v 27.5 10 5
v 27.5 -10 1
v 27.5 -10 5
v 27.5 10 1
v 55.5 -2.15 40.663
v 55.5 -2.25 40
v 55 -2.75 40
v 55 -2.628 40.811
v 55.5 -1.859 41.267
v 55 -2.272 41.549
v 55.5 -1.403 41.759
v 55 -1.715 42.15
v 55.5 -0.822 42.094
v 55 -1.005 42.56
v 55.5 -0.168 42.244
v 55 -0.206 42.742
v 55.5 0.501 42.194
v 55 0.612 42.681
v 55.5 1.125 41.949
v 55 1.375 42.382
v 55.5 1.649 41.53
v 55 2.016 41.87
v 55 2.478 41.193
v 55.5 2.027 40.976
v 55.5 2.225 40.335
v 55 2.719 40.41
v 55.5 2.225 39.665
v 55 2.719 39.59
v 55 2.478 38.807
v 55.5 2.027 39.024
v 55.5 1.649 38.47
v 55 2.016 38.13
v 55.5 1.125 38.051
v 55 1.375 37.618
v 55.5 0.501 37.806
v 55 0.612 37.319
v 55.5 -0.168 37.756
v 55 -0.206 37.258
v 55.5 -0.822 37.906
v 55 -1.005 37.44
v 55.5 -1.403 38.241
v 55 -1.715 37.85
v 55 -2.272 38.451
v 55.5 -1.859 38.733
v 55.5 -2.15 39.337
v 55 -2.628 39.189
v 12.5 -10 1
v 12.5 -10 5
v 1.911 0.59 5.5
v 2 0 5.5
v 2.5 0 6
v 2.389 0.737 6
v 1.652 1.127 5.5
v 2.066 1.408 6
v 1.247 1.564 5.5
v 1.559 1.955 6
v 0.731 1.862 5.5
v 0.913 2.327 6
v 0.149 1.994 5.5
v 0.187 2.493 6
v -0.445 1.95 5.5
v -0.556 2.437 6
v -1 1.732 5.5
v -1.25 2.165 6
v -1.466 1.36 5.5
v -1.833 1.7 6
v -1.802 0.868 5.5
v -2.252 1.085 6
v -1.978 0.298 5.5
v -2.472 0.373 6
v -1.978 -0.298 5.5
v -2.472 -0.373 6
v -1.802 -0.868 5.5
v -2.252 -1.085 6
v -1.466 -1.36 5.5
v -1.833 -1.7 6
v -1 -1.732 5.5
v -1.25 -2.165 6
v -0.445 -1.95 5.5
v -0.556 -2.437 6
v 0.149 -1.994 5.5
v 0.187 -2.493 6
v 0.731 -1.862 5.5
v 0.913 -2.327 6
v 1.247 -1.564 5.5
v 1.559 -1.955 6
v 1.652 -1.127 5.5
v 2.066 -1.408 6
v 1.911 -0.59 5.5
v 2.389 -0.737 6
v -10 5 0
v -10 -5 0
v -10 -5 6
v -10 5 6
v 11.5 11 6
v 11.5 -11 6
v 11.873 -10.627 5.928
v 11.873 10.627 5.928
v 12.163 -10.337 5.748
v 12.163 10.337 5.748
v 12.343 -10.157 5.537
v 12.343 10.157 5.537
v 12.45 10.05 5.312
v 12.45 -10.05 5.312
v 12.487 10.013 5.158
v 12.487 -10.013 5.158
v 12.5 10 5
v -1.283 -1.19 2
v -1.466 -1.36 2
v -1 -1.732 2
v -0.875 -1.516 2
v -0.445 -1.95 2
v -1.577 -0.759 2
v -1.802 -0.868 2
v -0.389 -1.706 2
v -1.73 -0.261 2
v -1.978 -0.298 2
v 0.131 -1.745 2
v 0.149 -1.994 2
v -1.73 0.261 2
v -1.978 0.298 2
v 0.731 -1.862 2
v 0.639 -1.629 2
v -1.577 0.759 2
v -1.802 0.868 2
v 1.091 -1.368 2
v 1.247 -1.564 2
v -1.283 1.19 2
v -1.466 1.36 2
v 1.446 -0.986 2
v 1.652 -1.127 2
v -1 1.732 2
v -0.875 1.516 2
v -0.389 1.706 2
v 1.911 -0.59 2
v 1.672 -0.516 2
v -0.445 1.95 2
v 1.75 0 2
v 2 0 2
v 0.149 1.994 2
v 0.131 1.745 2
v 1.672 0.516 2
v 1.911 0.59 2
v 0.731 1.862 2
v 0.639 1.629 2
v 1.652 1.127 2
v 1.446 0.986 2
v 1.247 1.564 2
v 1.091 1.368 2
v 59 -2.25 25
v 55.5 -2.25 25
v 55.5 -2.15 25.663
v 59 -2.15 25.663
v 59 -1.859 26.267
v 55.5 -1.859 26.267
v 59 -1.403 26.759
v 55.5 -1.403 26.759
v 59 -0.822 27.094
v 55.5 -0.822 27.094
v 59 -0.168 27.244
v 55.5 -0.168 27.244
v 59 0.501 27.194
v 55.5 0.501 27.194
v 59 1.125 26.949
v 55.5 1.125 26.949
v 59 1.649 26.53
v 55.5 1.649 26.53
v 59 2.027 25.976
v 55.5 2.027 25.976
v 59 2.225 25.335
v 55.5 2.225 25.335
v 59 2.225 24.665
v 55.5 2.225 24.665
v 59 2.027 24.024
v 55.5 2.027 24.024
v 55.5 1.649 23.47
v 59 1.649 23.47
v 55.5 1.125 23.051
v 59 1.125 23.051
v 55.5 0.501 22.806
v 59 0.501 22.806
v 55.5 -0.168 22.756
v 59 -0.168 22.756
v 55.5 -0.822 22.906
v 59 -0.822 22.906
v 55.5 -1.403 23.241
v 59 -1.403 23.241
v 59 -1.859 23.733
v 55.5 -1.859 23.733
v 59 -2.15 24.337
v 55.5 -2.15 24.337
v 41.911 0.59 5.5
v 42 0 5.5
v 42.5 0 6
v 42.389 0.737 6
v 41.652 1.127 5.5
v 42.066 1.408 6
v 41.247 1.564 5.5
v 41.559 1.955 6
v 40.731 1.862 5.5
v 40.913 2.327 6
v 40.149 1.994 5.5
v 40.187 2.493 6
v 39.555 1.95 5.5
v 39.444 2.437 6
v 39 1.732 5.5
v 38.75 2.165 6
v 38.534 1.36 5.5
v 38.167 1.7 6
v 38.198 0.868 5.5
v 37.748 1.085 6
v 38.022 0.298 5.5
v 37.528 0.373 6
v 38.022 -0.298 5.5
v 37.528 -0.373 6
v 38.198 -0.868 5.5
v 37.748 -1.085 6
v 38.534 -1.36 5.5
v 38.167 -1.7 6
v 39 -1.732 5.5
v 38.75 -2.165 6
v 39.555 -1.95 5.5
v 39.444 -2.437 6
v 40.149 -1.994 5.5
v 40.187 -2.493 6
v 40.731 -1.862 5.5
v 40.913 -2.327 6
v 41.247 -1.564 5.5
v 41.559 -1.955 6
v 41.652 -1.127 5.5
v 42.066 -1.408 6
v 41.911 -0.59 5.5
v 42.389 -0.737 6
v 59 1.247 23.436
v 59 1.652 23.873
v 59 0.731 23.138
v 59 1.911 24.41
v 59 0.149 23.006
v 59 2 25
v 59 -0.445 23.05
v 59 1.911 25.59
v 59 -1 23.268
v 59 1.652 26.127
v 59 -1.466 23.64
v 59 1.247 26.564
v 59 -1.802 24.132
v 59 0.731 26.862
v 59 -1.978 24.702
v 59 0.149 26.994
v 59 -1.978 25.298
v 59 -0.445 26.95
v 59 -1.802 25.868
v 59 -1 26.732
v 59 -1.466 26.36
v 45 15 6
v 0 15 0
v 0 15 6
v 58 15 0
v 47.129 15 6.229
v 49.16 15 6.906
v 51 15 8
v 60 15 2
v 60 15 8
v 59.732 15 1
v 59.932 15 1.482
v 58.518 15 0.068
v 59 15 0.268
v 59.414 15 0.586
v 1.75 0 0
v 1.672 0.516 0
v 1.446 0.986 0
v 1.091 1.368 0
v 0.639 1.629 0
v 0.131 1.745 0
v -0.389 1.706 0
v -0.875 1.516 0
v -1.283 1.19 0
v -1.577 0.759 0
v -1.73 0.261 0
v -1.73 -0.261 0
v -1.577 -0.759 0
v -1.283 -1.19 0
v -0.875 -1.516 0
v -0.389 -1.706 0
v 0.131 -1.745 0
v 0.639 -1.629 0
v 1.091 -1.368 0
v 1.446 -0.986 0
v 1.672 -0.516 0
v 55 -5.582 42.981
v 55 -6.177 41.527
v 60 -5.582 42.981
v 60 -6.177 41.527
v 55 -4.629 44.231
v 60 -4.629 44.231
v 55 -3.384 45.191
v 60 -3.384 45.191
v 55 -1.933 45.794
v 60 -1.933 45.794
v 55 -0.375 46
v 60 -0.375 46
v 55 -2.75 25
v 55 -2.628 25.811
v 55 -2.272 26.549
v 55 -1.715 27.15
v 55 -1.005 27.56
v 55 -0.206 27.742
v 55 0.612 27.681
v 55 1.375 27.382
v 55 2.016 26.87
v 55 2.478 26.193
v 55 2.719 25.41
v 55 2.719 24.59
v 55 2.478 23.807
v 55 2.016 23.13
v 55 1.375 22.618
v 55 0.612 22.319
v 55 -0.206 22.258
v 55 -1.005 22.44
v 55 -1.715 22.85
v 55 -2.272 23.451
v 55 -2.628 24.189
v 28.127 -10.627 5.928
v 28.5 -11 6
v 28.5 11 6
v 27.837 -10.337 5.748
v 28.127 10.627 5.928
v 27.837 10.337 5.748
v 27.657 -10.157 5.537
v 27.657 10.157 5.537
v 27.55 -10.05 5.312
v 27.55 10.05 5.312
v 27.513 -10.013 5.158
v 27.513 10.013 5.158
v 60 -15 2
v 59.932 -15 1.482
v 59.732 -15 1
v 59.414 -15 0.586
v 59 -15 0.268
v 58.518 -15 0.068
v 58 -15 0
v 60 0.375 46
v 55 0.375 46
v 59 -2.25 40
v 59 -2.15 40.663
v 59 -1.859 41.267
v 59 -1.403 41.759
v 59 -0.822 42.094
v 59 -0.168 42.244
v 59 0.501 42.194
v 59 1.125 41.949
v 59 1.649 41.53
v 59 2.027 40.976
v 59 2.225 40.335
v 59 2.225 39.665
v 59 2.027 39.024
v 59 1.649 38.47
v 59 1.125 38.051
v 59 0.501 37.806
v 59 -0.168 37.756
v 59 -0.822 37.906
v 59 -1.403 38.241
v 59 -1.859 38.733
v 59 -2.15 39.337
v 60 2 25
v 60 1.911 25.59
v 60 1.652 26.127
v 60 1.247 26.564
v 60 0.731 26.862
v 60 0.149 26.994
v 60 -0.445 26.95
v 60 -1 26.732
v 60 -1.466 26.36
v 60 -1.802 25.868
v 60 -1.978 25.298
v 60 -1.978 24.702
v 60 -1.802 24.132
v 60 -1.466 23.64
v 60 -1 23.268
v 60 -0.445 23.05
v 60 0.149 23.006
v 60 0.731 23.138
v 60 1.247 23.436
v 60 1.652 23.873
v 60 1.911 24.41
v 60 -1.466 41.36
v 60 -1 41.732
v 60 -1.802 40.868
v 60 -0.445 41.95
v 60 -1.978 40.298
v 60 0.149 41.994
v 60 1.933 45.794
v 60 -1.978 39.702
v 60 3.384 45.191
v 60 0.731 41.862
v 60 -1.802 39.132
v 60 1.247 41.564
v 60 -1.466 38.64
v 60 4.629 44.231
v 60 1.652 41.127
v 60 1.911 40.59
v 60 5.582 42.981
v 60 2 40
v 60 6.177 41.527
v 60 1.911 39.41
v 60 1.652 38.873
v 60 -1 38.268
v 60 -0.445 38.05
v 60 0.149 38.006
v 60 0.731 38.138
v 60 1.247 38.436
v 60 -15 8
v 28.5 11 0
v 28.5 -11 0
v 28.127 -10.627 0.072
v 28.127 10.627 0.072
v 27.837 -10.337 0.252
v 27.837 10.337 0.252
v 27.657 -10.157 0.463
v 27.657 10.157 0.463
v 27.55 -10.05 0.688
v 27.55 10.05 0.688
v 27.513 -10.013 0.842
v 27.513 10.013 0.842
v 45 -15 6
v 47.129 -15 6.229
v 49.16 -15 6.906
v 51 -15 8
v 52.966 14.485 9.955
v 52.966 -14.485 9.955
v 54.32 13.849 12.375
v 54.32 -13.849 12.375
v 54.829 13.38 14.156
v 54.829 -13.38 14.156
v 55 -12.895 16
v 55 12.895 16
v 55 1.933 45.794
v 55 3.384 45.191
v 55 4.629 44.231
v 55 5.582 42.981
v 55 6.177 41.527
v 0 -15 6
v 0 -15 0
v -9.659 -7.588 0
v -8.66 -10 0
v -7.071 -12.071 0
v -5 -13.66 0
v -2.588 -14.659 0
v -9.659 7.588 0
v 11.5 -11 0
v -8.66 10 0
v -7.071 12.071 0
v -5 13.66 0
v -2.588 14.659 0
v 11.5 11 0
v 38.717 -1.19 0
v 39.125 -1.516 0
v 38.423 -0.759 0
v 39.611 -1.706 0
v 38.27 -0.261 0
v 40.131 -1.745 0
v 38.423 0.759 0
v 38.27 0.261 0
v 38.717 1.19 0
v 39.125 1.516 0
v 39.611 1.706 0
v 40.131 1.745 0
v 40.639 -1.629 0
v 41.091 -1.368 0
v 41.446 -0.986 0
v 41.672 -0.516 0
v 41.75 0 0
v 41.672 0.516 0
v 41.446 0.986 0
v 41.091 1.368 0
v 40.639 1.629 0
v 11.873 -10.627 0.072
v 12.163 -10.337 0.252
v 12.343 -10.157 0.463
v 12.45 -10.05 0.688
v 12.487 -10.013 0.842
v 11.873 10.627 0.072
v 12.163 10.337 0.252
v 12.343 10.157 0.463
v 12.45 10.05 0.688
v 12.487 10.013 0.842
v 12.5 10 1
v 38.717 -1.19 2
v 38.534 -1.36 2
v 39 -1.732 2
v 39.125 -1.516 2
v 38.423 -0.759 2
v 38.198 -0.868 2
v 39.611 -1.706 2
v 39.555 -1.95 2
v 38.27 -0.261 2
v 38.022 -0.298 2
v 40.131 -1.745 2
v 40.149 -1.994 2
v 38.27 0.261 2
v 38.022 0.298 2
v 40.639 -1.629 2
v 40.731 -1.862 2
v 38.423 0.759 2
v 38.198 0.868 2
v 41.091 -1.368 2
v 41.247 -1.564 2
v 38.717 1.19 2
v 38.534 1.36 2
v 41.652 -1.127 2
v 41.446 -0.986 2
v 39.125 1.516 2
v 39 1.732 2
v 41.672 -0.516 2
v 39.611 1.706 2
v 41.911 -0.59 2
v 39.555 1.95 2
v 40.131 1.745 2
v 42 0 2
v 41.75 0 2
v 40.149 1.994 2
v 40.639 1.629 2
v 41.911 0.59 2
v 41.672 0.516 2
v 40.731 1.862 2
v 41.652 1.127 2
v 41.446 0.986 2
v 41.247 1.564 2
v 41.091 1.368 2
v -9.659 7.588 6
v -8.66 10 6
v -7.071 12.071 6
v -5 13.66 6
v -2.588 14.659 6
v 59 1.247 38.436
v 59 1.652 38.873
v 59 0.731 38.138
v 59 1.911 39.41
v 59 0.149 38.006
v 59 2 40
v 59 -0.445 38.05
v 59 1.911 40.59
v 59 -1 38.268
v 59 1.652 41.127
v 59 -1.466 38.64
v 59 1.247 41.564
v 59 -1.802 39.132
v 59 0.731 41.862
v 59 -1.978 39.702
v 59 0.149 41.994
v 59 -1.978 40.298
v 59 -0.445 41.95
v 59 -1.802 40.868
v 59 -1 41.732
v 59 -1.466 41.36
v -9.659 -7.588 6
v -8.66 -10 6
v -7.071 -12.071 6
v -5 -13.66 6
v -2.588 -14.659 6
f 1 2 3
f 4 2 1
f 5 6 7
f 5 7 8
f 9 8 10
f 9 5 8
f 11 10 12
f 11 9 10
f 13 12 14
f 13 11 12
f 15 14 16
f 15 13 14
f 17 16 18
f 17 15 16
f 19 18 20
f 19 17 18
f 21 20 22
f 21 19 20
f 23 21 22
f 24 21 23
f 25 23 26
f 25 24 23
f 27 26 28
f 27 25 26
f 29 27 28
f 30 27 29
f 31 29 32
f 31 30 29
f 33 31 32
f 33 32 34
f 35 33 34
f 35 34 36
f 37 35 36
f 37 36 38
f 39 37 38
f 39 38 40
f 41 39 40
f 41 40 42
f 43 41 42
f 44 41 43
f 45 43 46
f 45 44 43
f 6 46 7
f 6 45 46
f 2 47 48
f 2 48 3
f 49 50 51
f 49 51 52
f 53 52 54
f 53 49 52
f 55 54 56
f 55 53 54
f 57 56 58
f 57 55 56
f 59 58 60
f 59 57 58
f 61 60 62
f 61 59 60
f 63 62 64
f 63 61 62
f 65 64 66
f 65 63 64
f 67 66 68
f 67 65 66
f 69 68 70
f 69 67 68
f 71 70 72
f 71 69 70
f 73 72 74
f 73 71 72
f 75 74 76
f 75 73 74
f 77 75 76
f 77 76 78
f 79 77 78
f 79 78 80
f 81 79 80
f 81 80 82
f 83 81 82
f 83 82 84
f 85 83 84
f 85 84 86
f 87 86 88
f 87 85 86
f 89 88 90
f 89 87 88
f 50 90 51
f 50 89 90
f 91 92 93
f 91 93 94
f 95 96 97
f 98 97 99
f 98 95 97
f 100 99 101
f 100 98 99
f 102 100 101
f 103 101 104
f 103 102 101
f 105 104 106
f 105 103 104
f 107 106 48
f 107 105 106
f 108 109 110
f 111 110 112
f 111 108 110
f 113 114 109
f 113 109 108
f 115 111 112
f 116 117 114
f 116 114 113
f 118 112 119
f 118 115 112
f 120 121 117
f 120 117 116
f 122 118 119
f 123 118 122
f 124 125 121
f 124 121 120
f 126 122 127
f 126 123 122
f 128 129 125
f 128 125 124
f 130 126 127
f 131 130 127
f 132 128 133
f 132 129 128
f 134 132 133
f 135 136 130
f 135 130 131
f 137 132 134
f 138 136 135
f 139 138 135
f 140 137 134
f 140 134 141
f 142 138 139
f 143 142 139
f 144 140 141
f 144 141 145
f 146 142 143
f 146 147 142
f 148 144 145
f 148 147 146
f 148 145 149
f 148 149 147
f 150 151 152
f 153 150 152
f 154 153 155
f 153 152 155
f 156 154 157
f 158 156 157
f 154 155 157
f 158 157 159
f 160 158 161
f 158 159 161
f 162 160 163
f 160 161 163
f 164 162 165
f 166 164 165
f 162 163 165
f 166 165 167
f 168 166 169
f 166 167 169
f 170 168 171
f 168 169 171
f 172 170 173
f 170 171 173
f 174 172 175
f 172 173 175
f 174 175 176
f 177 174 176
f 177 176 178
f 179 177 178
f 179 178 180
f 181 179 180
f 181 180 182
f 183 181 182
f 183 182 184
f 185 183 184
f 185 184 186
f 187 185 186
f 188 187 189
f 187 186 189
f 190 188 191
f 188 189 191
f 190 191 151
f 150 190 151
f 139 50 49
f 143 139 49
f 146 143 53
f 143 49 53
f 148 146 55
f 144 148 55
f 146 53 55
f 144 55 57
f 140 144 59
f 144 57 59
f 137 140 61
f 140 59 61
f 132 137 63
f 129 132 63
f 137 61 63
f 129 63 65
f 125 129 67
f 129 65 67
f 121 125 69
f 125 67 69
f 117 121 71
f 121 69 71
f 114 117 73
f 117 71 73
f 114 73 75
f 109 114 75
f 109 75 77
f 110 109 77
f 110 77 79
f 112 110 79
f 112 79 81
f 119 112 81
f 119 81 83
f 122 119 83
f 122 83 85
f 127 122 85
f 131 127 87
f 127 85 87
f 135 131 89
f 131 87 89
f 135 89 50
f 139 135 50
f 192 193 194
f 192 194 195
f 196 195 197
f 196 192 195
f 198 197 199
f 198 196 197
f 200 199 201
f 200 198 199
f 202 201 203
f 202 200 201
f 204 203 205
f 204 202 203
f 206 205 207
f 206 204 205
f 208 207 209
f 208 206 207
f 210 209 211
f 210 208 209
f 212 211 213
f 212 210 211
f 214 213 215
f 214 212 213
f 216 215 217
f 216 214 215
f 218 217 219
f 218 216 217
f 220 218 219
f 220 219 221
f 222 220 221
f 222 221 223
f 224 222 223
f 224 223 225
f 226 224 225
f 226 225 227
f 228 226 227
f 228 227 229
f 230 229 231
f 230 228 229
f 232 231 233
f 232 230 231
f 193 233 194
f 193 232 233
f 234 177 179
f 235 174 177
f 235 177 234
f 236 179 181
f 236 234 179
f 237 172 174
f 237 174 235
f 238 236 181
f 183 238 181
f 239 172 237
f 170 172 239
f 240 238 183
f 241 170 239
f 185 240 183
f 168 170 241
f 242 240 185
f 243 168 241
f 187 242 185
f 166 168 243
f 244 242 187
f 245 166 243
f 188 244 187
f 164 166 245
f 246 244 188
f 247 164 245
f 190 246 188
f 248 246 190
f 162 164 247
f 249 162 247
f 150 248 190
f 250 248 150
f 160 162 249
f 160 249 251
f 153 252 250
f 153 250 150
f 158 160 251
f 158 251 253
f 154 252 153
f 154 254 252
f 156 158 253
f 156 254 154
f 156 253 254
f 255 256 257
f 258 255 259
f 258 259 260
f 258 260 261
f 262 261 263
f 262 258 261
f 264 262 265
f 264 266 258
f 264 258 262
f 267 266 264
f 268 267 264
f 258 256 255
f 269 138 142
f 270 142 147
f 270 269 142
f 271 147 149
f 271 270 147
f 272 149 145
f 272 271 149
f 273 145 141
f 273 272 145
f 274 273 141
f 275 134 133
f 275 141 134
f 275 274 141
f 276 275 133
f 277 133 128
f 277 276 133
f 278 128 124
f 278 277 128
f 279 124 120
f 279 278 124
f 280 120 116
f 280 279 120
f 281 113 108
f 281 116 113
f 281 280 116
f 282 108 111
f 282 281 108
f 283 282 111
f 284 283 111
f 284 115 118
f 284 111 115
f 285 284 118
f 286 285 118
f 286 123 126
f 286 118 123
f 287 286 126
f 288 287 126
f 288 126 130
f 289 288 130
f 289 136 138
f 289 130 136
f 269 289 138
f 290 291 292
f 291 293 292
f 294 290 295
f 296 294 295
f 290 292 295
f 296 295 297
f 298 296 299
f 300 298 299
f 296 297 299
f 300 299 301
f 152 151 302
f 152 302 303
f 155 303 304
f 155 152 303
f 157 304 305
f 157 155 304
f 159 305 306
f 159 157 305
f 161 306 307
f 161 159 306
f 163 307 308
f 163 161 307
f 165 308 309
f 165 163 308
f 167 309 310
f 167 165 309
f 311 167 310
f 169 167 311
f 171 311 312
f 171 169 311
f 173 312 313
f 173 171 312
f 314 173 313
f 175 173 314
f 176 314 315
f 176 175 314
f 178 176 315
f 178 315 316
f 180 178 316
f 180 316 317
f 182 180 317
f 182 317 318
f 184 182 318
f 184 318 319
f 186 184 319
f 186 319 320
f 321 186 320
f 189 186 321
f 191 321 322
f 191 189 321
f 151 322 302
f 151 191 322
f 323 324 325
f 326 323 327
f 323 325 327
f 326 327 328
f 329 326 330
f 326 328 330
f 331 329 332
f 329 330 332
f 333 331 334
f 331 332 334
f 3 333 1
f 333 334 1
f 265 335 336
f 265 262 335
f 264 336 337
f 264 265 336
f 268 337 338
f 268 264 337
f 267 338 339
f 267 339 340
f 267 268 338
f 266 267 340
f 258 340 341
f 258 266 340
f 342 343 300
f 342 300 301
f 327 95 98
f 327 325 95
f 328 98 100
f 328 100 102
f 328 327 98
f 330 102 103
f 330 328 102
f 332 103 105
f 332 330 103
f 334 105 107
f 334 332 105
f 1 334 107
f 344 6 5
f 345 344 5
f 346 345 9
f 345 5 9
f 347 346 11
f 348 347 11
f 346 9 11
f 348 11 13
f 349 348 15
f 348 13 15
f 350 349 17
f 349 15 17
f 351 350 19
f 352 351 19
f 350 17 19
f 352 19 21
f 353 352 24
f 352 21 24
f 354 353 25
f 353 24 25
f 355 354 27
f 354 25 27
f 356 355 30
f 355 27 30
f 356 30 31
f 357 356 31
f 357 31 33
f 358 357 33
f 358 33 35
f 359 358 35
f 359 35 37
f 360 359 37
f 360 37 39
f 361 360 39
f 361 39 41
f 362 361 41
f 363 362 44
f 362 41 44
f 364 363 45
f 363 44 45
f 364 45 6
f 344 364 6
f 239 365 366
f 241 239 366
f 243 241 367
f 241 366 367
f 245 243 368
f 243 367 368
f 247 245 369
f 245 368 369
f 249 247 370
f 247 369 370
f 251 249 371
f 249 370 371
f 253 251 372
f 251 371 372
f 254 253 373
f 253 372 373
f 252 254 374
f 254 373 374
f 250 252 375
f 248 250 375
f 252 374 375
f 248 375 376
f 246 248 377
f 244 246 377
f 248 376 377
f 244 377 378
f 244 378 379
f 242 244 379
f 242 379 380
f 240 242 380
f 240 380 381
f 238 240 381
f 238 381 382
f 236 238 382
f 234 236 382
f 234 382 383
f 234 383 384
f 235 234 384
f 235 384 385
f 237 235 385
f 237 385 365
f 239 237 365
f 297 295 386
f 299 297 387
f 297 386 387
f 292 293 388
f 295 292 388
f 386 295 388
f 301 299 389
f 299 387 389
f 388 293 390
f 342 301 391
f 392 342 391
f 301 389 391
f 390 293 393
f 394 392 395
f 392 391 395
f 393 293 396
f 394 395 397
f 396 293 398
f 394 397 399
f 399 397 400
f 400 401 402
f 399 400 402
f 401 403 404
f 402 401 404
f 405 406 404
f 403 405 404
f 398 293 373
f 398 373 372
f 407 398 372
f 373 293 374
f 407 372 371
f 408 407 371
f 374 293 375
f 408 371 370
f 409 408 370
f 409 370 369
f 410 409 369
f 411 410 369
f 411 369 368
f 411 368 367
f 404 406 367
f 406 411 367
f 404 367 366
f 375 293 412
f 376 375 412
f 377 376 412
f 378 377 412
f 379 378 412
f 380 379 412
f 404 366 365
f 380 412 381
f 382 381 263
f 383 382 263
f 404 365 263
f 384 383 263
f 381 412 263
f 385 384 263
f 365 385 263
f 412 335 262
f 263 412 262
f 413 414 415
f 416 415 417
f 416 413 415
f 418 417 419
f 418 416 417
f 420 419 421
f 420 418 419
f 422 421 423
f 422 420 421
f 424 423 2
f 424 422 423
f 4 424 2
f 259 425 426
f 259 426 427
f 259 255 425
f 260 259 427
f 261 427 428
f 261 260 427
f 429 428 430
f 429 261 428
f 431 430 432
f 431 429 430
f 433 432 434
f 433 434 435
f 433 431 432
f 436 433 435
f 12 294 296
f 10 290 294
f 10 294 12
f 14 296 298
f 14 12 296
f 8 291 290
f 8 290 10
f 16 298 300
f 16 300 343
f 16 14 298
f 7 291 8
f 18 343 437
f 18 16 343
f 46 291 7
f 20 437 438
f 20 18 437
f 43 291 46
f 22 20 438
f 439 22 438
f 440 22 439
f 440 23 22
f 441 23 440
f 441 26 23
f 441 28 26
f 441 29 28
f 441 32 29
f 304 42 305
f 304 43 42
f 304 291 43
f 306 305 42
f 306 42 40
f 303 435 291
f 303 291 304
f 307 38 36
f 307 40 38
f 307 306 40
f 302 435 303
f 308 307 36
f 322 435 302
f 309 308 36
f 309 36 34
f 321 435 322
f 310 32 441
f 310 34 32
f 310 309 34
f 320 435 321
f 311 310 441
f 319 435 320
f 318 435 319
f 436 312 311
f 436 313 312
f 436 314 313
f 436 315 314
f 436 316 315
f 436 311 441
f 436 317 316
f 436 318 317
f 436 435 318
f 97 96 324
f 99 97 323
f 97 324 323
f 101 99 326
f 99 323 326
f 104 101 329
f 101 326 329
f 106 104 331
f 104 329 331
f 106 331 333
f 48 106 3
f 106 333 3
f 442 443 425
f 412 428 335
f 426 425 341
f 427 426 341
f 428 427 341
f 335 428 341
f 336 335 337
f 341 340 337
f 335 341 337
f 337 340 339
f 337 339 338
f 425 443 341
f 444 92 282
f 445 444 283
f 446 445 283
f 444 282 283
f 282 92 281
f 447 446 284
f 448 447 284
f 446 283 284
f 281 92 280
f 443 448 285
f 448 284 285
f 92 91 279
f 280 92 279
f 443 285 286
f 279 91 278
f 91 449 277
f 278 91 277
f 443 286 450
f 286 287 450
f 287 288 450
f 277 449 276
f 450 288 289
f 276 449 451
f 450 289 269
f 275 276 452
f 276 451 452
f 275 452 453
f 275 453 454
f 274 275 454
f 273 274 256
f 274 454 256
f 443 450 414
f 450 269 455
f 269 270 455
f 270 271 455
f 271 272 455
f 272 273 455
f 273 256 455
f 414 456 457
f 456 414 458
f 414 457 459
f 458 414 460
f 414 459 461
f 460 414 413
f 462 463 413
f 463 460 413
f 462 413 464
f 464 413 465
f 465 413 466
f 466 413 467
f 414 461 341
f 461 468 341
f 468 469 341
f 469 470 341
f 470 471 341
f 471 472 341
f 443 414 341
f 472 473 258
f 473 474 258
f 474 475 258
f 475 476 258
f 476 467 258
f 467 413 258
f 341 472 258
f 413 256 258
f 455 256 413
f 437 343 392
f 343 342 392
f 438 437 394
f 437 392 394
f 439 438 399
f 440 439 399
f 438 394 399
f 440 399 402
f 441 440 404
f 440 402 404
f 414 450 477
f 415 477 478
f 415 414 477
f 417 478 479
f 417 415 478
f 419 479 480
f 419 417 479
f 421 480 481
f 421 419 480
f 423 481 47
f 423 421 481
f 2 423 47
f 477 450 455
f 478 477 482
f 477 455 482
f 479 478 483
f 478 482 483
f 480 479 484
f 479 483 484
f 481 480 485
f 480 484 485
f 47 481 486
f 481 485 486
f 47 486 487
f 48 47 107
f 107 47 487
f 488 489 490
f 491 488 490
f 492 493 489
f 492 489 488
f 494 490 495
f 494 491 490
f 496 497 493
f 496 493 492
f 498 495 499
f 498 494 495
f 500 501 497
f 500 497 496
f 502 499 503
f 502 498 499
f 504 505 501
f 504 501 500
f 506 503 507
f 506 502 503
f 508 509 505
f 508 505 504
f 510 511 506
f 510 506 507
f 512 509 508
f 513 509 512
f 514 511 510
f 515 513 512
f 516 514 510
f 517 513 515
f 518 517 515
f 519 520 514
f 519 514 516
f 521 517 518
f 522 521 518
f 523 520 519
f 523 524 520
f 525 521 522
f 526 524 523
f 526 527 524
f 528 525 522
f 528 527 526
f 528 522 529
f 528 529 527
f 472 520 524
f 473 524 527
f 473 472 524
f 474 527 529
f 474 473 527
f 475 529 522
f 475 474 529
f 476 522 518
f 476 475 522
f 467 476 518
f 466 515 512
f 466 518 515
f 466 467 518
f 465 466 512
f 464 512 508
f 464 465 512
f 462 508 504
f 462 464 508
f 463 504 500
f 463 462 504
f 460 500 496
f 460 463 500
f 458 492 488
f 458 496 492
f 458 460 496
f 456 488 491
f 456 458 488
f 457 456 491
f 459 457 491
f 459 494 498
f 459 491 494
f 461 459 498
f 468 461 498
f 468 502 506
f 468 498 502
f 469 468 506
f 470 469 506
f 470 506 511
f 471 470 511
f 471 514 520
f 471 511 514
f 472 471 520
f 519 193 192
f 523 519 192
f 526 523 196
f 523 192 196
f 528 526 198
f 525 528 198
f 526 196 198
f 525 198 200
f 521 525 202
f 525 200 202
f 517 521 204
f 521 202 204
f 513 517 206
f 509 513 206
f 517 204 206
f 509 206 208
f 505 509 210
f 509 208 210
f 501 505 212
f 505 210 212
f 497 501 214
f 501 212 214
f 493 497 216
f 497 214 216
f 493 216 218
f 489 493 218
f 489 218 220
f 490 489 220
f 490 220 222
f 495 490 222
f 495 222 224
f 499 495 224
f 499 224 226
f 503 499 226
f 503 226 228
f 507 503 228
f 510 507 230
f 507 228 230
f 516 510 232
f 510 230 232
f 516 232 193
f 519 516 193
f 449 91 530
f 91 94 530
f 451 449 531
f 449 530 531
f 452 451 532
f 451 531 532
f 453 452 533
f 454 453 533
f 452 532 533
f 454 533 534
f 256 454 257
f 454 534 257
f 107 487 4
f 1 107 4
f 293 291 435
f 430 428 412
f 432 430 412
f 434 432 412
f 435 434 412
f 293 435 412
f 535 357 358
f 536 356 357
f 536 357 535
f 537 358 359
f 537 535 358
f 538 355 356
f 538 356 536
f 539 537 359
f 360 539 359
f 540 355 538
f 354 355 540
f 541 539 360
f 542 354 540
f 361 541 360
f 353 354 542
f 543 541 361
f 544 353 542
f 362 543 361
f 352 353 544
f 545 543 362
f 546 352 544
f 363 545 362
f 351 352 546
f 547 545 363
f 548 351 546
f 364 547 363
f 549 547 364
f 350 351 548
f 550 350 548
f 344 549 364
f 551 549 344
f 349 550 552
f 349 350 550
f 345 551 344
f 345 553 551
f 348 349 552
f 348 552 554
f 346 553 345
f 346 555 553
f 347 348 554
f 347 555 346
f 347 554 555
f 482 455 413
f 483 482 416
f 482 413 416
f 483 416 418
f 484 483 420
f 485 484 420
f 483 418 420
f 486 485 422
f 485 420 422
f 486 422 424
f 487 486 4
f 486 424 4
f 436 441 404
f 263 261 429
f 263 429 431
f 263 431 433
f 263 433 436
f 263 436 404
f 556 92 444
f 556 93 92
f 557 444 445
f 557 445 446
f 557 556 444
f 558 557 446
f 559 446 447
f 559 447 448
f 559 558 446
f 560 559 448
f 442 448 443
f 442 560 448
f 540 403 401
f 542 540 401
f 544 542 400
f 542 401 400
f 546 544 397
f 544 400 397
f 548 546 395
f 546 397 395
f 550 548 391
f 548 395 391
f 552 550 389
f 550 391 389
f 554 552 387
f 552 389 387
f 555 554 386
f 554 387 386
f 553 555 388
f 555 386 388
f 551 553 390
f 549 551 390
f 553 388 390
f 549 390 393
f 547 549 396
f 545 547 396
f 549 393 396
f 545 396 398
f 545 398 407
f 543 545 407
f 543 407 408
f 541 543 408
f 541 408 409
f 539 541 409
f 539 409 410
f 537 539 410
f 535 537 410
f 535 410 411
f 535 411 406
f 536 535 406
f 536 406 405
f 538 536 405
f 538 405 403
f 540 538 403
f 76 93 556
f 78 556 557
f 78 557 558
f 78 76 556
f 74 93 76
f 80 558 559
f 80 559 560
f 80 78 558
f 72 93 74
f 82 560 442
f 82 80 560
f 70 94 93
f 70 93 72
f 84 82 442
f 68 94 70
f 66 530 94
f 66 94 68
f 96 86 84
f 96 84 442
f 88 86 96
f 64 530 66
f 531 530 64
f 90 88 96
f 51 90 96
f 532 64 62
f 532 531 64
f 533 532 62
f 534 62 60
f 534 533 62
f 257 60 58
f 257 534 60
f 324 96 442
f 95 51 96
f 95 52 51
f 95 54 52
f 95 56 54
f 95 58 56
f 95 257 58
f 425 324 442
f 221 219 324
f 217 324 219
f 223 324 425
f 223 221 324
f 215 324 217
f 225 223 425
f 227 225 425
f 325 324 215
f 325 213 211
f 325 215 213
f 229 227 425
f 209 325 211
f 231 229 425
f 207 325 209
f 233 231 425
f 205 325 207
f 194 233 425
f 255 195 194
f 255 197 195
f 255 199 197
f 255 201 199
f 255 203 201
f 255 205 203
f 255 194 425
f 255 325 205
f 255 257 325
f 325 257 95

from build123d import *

# Parameters (mm, degrees)
SKETCH_W        = 70
SKETCH_H        = 30
SKETCH_R        = 1.75
SKETCH_W_2      = 15
SKETCH_H_2      = 20
PAD_DEPTH       = 6
FILLET_R        = 10
FILLET001_R     = 1
SKETCH001_W     = 5
SKETCH001_H     = 30
PAD001_DEPTH    = 40
CHAMFER_SIZE2   = 38
CHAMFER_SIZE    = 10
SKETCH002_R     = 2
POCKET_DEPTH    = 4
CHAMFER001_SIZE = 0.5
FILLET002_R     = 10
FILLET003_R     = 2
FILLET004_R     = 6
SKETCH003_R     = 2
POCKET001_DEPTH = 70.001
SKETCH004_R     = 2.25
POCKET002_DEPTH = 4
CHAMFER002_SIZE = 0.5


with BuildPart() as part:
    # Sketch → Pad (new body)
    with BuildSketch(Plane.XY):
        with Locations((25, 0)):
            Rectangle(SKETCH_W, SKETCH_H)
        Circle(SKETCH_R, mode=Mode.SUBTRACT)
        with Locations((40, 0)):
            Circle(SKETCH_R, mode=Mode.SUBTRACT)
        with Locations((20, 0)):
            Rectangle(SKETCH_W_2, SKETCH_H_2, mode=Mode.SUBTRACT)
    extrude(amount=PAD_DEPTH)

    # Fillet
    fillet_edges = [part.edges().sort_by_distance(p)[0] for p in [
        (-10, 15, 3),
        (-10, -15, 3),
    ]]
    fillet(fillet_edges, radius=FILLET_R)

    # Fillet001
    fillet001_edges = [part.edges().sort_by_distance(p)[0] for p in [
        (12.5, 0, 6),
        (12.5, 0, 0),
        (20, 10, 0),
        (20, 10, 6),
        (27.5, 0, 6),
        (20, -10, 6),
        (27.5, 0, 0),
        (20, -10, 0),
    ]]
    fillet(fillet001_edges, radius=FILLET001_R)

    # Sketch001 (on Face18 of Fillet001) → Pad001 (join)
    with BuildSketch(Plane.XY.offset(6)):
        with Locations((57.5, 0)):
            Rectangle(SKETCH001_W, SKETCH001_H)
    extrude(amount=PAD001_DEPTH)

    # Chamfer
    chamfer_edges = [part.edges().sort_by_distance(p)[0] for p in [
        (57.5, -15, 46),
        (57.5, 15, 46),
    ]]
    chamfer_side = part.faces().sort_by_distance((57.5, 0, 46))[0]
    chamfer(chamfer_edges, length=CHAMFER_SIZE, length2=CHAMFER_SIZE2, reference=chamfer_side)

    # Sketch002 (on Face4 of Chamfer) → Pocket (cut)
    with BuildSketch(Plane.XY.offset(6)):
        Circle(SKETCH002_R)
        with Locations((40, 0)):
            Circle(SKETCH002_R)
    extrude(amount=-POCKET_DEPTH, mode=Mode.SUBTRACT)

    # Chamfer001
    chamfer001_edges = [part.edges().sort_by_distance(p)[0] for p in [
        (-2, 0, 6),
        (38, 0, 6),
    ]]
    chamfer(chamfer001_edges, length=CHAMFER001_SIZE)

    # Fillet002
    fillet002_edges = [part.edges().sort_by_distance(p)[0] for p in [
        (55, 0, 6),
    ]]
    fillet(fillet002_edges, radius=FILLET002_R)

    # Fillet003
    fillet003_edges = [part.edges().sort_by_distance(p)[0] for p in [
        (60, 0, 0),
    ]]
    fillet(fillet003_edges, radius=FILLET003_R)

    # Fillet004
    fillet004_edges = [part.edges().sort_by_distance(p)[0] for p in [
        (57.5, -5, 46),
        (57.5, 5, 46),
    ]]
    fillet(fillet004_edges, radius=FILLET004_R)

    # Sketch003 (on Face2 of Fillet003) → Pocket001 (cut, through all)
    with BuildSketch(Plane.YZ.offset(60)):
        with Locations((0, 40)):
            Circle(SKETCH003_R)
        with Locations((0, 25)):
            Circle(SKETCH003_R)
    extrude(amount=-POCKET001_DEPTH, mode=Mode.SUBTRACT)

    # Sketch004 (on Face12 of Pocket001) → Pocket002 (cut)
    with BuildSketch(Plane(origin=(55, 0, 0), x_dir=(0, -1, 0), z_dir=(-1, 0, 0))):
        with Locations((0, 40)):
            Circle(SKETCH004_R)
        with Locations((0, 25)):
            Circle(SKETCH004_R)
    extrude(amount=-POCKET002_DEPTH, mode=Mode.SUBTRACT)

    # Chamfer002
    chamfer002_edges = [part.edges().sort_by_distance(p)[0] for p in [
        (55, 2.25, 40),
        (55, 2.25, 25),
    ]]
    chamfer(chamfer002_edges, length=CHAMFER002_SIZE)


solid = part.part
